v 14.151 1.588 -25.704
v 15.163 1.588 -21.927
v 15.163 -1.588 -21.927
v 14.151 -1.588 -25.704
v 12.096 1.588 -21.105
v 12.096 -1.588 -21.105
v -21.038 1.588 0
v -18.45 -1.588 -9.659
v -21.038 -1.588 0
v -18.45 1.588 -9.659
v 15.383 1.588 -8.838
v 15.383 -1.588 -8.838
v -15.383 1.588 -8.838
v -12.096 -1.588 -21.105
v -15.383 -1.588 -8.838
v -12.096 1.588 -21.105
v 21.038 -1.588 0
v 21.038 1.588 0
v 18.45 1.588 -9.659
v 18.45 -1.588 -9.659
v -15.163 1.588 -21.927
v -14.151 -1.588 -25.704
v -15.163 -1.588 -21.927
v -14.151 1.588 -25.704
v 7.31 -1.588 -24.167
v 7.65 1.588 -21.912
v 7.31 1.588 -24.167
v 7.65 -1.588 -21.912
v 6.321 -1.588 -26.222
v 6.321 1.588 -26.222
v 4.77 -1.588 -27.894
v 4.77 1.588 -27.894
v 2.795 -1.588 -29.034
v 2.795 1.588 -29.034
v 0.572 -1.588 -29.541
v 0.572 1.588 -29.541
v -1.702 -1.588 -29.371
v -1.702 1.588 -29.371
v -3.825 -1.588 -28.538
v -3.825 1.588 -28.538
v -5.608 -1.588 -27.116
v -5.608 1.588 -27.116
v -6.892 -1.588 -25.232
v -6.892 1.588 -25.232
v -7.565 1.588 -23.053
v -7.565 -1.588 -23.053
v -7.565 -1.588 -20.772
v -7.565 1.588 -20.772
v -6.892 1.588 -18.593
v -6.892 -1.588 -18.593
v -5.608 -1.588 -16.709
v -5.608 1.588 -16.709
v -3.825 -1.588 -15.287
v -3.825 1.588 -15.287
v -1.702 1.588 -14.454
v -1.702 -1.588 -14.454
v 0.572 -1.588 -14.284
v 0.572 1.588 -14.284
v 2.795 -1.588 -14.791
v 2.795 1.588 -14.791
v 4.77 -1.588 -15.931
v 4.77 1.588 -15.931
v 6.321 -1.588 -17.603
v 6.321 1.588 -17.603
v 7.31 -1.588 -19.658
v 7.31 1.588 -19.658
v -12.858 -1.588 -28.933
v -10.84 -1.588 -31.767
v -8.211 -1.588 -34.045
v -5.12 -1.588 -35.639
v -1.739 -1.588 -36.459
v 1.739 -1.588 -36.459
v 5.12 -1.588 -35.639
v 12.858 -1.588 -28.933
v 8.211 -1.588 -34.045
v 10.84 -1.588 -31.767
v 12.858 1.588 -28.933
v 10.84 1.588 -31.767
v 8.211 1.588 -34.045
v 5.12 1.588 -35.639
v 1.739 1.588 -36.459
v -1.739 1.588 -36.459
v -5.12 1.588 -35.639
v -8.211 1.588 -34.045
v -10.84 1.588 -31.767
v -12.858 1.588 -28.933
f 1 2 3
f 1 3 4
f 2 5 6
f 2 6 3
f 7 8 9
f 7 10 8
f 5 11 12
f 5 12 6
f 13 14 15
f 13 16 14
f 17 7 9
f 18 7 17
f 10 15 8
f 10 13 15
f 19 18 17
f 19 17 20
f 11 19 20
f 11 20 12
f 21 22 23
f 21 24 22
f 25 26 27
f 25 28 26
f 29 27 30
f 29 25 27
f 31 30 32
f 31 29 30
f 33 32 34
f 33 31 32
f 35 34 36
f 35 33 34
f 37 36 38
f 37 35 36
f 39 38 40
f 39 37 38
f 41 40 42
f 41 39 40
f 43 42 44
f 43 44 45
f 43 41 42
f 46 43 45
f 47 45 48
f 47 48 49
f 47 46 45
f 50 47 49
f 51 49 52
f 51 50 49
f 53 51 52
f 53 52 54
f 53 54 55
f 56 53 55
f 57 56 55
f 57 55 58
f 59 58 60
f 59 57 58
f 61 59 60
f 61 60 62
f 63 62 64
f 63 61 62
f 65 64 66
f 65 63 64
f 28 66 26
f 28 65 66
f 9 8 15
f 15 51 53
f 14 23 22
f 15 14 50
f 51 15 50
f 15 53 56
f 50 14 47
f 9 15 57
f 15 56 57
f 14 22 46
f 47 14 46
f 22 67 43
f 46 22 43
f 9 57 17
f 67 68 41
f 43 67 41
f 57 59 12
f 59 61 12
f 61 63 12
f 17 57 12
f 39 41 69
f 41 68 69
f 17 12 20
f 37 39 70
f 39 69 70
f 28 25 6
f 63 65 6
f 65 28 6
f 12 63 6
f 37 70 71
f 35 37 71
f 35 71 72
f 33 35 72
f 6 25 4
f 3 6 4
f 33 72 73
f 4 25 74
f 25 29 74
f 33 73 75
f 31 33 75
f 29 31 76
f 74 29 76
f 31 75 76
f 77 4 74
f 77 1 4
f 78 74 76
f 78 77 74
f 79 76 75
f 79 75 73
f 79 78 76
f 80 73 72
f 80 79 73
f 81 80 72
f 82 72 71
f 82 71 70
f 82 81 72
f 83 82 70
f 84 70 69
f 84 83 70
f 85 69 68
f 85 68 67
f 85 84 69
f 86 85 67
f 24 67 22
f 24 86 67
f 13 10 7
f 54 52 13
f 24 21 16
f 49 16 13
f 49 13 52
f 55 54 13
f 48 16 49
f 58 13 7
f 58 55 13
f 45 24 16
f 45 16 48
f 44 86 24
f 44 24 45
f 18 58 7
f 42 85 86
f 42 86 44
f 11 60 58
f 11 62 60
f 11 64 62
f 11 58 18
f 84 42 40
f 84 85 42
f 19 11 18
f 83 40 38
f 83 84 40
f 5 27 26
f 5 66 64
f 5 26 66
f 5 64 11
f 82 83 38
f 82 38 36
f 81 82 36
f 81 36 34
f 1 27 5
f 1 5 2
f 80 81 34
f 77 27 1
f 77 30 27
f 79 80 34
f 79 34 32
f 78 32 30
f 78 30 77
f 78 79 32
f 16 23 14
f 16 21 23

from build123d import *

# Parameters (mm, degrees)
SKETCH1_R           = 7.65
BOSS_EXTRUDE1_DEPTH = 1.5875


with BuildPart() as part:
    # Sketch1 → Boss-Extrude1 (new, symmetric)
    with BuildSketch(Plane(origin=(0, 0, 0), x_dir=(1, 0, 0), z_dir=(0, 1, 0))):
        with BuildLine():
            Line((-18.450042271, 9.659258263), (-21.038232722, 0))
            Line((-21.038232722, 0), (21.038232722, 0))
            Line((21.038232722, 0), (18.450042271, 9.659258263))
            Line((18.450042271, 9.659258263), (15.383227773, 8.837507795))
            Line((15.383227773, 8.837507795), (12.0962259, 21.104765789))
            Line((12.0962259, 21.104765789), (15.163040398, 21.926516257))
            Line((15.163040398, 21.926516257), (14.150813355, 25.704199011))
            ThreePointArc((14.150813355, 25.704199011), (0, 36.5625), (-14.150813355, 25.704199011))
            Line((-14.150813355, 25.704199011), (-15.163040398, 21.926516257))
            Line((-15.163040398, 21.926516257), (-12.0962259, 21.104765789))
            Line((-12.0962259, 21.104765789), (-15.383227773, 8.837507795))
            Line((-15.383227773, 8.837507795), (-18.450042271, 9.659258263))
        make_face()
        with Locations((0, 21.9125)):
            Circle(SKETCH1_R, mode=Mode.SUBTRACT)
    extrude(amount=BOSS_EXTRUDE1_DEPTH, both=True)


solid = part.part
